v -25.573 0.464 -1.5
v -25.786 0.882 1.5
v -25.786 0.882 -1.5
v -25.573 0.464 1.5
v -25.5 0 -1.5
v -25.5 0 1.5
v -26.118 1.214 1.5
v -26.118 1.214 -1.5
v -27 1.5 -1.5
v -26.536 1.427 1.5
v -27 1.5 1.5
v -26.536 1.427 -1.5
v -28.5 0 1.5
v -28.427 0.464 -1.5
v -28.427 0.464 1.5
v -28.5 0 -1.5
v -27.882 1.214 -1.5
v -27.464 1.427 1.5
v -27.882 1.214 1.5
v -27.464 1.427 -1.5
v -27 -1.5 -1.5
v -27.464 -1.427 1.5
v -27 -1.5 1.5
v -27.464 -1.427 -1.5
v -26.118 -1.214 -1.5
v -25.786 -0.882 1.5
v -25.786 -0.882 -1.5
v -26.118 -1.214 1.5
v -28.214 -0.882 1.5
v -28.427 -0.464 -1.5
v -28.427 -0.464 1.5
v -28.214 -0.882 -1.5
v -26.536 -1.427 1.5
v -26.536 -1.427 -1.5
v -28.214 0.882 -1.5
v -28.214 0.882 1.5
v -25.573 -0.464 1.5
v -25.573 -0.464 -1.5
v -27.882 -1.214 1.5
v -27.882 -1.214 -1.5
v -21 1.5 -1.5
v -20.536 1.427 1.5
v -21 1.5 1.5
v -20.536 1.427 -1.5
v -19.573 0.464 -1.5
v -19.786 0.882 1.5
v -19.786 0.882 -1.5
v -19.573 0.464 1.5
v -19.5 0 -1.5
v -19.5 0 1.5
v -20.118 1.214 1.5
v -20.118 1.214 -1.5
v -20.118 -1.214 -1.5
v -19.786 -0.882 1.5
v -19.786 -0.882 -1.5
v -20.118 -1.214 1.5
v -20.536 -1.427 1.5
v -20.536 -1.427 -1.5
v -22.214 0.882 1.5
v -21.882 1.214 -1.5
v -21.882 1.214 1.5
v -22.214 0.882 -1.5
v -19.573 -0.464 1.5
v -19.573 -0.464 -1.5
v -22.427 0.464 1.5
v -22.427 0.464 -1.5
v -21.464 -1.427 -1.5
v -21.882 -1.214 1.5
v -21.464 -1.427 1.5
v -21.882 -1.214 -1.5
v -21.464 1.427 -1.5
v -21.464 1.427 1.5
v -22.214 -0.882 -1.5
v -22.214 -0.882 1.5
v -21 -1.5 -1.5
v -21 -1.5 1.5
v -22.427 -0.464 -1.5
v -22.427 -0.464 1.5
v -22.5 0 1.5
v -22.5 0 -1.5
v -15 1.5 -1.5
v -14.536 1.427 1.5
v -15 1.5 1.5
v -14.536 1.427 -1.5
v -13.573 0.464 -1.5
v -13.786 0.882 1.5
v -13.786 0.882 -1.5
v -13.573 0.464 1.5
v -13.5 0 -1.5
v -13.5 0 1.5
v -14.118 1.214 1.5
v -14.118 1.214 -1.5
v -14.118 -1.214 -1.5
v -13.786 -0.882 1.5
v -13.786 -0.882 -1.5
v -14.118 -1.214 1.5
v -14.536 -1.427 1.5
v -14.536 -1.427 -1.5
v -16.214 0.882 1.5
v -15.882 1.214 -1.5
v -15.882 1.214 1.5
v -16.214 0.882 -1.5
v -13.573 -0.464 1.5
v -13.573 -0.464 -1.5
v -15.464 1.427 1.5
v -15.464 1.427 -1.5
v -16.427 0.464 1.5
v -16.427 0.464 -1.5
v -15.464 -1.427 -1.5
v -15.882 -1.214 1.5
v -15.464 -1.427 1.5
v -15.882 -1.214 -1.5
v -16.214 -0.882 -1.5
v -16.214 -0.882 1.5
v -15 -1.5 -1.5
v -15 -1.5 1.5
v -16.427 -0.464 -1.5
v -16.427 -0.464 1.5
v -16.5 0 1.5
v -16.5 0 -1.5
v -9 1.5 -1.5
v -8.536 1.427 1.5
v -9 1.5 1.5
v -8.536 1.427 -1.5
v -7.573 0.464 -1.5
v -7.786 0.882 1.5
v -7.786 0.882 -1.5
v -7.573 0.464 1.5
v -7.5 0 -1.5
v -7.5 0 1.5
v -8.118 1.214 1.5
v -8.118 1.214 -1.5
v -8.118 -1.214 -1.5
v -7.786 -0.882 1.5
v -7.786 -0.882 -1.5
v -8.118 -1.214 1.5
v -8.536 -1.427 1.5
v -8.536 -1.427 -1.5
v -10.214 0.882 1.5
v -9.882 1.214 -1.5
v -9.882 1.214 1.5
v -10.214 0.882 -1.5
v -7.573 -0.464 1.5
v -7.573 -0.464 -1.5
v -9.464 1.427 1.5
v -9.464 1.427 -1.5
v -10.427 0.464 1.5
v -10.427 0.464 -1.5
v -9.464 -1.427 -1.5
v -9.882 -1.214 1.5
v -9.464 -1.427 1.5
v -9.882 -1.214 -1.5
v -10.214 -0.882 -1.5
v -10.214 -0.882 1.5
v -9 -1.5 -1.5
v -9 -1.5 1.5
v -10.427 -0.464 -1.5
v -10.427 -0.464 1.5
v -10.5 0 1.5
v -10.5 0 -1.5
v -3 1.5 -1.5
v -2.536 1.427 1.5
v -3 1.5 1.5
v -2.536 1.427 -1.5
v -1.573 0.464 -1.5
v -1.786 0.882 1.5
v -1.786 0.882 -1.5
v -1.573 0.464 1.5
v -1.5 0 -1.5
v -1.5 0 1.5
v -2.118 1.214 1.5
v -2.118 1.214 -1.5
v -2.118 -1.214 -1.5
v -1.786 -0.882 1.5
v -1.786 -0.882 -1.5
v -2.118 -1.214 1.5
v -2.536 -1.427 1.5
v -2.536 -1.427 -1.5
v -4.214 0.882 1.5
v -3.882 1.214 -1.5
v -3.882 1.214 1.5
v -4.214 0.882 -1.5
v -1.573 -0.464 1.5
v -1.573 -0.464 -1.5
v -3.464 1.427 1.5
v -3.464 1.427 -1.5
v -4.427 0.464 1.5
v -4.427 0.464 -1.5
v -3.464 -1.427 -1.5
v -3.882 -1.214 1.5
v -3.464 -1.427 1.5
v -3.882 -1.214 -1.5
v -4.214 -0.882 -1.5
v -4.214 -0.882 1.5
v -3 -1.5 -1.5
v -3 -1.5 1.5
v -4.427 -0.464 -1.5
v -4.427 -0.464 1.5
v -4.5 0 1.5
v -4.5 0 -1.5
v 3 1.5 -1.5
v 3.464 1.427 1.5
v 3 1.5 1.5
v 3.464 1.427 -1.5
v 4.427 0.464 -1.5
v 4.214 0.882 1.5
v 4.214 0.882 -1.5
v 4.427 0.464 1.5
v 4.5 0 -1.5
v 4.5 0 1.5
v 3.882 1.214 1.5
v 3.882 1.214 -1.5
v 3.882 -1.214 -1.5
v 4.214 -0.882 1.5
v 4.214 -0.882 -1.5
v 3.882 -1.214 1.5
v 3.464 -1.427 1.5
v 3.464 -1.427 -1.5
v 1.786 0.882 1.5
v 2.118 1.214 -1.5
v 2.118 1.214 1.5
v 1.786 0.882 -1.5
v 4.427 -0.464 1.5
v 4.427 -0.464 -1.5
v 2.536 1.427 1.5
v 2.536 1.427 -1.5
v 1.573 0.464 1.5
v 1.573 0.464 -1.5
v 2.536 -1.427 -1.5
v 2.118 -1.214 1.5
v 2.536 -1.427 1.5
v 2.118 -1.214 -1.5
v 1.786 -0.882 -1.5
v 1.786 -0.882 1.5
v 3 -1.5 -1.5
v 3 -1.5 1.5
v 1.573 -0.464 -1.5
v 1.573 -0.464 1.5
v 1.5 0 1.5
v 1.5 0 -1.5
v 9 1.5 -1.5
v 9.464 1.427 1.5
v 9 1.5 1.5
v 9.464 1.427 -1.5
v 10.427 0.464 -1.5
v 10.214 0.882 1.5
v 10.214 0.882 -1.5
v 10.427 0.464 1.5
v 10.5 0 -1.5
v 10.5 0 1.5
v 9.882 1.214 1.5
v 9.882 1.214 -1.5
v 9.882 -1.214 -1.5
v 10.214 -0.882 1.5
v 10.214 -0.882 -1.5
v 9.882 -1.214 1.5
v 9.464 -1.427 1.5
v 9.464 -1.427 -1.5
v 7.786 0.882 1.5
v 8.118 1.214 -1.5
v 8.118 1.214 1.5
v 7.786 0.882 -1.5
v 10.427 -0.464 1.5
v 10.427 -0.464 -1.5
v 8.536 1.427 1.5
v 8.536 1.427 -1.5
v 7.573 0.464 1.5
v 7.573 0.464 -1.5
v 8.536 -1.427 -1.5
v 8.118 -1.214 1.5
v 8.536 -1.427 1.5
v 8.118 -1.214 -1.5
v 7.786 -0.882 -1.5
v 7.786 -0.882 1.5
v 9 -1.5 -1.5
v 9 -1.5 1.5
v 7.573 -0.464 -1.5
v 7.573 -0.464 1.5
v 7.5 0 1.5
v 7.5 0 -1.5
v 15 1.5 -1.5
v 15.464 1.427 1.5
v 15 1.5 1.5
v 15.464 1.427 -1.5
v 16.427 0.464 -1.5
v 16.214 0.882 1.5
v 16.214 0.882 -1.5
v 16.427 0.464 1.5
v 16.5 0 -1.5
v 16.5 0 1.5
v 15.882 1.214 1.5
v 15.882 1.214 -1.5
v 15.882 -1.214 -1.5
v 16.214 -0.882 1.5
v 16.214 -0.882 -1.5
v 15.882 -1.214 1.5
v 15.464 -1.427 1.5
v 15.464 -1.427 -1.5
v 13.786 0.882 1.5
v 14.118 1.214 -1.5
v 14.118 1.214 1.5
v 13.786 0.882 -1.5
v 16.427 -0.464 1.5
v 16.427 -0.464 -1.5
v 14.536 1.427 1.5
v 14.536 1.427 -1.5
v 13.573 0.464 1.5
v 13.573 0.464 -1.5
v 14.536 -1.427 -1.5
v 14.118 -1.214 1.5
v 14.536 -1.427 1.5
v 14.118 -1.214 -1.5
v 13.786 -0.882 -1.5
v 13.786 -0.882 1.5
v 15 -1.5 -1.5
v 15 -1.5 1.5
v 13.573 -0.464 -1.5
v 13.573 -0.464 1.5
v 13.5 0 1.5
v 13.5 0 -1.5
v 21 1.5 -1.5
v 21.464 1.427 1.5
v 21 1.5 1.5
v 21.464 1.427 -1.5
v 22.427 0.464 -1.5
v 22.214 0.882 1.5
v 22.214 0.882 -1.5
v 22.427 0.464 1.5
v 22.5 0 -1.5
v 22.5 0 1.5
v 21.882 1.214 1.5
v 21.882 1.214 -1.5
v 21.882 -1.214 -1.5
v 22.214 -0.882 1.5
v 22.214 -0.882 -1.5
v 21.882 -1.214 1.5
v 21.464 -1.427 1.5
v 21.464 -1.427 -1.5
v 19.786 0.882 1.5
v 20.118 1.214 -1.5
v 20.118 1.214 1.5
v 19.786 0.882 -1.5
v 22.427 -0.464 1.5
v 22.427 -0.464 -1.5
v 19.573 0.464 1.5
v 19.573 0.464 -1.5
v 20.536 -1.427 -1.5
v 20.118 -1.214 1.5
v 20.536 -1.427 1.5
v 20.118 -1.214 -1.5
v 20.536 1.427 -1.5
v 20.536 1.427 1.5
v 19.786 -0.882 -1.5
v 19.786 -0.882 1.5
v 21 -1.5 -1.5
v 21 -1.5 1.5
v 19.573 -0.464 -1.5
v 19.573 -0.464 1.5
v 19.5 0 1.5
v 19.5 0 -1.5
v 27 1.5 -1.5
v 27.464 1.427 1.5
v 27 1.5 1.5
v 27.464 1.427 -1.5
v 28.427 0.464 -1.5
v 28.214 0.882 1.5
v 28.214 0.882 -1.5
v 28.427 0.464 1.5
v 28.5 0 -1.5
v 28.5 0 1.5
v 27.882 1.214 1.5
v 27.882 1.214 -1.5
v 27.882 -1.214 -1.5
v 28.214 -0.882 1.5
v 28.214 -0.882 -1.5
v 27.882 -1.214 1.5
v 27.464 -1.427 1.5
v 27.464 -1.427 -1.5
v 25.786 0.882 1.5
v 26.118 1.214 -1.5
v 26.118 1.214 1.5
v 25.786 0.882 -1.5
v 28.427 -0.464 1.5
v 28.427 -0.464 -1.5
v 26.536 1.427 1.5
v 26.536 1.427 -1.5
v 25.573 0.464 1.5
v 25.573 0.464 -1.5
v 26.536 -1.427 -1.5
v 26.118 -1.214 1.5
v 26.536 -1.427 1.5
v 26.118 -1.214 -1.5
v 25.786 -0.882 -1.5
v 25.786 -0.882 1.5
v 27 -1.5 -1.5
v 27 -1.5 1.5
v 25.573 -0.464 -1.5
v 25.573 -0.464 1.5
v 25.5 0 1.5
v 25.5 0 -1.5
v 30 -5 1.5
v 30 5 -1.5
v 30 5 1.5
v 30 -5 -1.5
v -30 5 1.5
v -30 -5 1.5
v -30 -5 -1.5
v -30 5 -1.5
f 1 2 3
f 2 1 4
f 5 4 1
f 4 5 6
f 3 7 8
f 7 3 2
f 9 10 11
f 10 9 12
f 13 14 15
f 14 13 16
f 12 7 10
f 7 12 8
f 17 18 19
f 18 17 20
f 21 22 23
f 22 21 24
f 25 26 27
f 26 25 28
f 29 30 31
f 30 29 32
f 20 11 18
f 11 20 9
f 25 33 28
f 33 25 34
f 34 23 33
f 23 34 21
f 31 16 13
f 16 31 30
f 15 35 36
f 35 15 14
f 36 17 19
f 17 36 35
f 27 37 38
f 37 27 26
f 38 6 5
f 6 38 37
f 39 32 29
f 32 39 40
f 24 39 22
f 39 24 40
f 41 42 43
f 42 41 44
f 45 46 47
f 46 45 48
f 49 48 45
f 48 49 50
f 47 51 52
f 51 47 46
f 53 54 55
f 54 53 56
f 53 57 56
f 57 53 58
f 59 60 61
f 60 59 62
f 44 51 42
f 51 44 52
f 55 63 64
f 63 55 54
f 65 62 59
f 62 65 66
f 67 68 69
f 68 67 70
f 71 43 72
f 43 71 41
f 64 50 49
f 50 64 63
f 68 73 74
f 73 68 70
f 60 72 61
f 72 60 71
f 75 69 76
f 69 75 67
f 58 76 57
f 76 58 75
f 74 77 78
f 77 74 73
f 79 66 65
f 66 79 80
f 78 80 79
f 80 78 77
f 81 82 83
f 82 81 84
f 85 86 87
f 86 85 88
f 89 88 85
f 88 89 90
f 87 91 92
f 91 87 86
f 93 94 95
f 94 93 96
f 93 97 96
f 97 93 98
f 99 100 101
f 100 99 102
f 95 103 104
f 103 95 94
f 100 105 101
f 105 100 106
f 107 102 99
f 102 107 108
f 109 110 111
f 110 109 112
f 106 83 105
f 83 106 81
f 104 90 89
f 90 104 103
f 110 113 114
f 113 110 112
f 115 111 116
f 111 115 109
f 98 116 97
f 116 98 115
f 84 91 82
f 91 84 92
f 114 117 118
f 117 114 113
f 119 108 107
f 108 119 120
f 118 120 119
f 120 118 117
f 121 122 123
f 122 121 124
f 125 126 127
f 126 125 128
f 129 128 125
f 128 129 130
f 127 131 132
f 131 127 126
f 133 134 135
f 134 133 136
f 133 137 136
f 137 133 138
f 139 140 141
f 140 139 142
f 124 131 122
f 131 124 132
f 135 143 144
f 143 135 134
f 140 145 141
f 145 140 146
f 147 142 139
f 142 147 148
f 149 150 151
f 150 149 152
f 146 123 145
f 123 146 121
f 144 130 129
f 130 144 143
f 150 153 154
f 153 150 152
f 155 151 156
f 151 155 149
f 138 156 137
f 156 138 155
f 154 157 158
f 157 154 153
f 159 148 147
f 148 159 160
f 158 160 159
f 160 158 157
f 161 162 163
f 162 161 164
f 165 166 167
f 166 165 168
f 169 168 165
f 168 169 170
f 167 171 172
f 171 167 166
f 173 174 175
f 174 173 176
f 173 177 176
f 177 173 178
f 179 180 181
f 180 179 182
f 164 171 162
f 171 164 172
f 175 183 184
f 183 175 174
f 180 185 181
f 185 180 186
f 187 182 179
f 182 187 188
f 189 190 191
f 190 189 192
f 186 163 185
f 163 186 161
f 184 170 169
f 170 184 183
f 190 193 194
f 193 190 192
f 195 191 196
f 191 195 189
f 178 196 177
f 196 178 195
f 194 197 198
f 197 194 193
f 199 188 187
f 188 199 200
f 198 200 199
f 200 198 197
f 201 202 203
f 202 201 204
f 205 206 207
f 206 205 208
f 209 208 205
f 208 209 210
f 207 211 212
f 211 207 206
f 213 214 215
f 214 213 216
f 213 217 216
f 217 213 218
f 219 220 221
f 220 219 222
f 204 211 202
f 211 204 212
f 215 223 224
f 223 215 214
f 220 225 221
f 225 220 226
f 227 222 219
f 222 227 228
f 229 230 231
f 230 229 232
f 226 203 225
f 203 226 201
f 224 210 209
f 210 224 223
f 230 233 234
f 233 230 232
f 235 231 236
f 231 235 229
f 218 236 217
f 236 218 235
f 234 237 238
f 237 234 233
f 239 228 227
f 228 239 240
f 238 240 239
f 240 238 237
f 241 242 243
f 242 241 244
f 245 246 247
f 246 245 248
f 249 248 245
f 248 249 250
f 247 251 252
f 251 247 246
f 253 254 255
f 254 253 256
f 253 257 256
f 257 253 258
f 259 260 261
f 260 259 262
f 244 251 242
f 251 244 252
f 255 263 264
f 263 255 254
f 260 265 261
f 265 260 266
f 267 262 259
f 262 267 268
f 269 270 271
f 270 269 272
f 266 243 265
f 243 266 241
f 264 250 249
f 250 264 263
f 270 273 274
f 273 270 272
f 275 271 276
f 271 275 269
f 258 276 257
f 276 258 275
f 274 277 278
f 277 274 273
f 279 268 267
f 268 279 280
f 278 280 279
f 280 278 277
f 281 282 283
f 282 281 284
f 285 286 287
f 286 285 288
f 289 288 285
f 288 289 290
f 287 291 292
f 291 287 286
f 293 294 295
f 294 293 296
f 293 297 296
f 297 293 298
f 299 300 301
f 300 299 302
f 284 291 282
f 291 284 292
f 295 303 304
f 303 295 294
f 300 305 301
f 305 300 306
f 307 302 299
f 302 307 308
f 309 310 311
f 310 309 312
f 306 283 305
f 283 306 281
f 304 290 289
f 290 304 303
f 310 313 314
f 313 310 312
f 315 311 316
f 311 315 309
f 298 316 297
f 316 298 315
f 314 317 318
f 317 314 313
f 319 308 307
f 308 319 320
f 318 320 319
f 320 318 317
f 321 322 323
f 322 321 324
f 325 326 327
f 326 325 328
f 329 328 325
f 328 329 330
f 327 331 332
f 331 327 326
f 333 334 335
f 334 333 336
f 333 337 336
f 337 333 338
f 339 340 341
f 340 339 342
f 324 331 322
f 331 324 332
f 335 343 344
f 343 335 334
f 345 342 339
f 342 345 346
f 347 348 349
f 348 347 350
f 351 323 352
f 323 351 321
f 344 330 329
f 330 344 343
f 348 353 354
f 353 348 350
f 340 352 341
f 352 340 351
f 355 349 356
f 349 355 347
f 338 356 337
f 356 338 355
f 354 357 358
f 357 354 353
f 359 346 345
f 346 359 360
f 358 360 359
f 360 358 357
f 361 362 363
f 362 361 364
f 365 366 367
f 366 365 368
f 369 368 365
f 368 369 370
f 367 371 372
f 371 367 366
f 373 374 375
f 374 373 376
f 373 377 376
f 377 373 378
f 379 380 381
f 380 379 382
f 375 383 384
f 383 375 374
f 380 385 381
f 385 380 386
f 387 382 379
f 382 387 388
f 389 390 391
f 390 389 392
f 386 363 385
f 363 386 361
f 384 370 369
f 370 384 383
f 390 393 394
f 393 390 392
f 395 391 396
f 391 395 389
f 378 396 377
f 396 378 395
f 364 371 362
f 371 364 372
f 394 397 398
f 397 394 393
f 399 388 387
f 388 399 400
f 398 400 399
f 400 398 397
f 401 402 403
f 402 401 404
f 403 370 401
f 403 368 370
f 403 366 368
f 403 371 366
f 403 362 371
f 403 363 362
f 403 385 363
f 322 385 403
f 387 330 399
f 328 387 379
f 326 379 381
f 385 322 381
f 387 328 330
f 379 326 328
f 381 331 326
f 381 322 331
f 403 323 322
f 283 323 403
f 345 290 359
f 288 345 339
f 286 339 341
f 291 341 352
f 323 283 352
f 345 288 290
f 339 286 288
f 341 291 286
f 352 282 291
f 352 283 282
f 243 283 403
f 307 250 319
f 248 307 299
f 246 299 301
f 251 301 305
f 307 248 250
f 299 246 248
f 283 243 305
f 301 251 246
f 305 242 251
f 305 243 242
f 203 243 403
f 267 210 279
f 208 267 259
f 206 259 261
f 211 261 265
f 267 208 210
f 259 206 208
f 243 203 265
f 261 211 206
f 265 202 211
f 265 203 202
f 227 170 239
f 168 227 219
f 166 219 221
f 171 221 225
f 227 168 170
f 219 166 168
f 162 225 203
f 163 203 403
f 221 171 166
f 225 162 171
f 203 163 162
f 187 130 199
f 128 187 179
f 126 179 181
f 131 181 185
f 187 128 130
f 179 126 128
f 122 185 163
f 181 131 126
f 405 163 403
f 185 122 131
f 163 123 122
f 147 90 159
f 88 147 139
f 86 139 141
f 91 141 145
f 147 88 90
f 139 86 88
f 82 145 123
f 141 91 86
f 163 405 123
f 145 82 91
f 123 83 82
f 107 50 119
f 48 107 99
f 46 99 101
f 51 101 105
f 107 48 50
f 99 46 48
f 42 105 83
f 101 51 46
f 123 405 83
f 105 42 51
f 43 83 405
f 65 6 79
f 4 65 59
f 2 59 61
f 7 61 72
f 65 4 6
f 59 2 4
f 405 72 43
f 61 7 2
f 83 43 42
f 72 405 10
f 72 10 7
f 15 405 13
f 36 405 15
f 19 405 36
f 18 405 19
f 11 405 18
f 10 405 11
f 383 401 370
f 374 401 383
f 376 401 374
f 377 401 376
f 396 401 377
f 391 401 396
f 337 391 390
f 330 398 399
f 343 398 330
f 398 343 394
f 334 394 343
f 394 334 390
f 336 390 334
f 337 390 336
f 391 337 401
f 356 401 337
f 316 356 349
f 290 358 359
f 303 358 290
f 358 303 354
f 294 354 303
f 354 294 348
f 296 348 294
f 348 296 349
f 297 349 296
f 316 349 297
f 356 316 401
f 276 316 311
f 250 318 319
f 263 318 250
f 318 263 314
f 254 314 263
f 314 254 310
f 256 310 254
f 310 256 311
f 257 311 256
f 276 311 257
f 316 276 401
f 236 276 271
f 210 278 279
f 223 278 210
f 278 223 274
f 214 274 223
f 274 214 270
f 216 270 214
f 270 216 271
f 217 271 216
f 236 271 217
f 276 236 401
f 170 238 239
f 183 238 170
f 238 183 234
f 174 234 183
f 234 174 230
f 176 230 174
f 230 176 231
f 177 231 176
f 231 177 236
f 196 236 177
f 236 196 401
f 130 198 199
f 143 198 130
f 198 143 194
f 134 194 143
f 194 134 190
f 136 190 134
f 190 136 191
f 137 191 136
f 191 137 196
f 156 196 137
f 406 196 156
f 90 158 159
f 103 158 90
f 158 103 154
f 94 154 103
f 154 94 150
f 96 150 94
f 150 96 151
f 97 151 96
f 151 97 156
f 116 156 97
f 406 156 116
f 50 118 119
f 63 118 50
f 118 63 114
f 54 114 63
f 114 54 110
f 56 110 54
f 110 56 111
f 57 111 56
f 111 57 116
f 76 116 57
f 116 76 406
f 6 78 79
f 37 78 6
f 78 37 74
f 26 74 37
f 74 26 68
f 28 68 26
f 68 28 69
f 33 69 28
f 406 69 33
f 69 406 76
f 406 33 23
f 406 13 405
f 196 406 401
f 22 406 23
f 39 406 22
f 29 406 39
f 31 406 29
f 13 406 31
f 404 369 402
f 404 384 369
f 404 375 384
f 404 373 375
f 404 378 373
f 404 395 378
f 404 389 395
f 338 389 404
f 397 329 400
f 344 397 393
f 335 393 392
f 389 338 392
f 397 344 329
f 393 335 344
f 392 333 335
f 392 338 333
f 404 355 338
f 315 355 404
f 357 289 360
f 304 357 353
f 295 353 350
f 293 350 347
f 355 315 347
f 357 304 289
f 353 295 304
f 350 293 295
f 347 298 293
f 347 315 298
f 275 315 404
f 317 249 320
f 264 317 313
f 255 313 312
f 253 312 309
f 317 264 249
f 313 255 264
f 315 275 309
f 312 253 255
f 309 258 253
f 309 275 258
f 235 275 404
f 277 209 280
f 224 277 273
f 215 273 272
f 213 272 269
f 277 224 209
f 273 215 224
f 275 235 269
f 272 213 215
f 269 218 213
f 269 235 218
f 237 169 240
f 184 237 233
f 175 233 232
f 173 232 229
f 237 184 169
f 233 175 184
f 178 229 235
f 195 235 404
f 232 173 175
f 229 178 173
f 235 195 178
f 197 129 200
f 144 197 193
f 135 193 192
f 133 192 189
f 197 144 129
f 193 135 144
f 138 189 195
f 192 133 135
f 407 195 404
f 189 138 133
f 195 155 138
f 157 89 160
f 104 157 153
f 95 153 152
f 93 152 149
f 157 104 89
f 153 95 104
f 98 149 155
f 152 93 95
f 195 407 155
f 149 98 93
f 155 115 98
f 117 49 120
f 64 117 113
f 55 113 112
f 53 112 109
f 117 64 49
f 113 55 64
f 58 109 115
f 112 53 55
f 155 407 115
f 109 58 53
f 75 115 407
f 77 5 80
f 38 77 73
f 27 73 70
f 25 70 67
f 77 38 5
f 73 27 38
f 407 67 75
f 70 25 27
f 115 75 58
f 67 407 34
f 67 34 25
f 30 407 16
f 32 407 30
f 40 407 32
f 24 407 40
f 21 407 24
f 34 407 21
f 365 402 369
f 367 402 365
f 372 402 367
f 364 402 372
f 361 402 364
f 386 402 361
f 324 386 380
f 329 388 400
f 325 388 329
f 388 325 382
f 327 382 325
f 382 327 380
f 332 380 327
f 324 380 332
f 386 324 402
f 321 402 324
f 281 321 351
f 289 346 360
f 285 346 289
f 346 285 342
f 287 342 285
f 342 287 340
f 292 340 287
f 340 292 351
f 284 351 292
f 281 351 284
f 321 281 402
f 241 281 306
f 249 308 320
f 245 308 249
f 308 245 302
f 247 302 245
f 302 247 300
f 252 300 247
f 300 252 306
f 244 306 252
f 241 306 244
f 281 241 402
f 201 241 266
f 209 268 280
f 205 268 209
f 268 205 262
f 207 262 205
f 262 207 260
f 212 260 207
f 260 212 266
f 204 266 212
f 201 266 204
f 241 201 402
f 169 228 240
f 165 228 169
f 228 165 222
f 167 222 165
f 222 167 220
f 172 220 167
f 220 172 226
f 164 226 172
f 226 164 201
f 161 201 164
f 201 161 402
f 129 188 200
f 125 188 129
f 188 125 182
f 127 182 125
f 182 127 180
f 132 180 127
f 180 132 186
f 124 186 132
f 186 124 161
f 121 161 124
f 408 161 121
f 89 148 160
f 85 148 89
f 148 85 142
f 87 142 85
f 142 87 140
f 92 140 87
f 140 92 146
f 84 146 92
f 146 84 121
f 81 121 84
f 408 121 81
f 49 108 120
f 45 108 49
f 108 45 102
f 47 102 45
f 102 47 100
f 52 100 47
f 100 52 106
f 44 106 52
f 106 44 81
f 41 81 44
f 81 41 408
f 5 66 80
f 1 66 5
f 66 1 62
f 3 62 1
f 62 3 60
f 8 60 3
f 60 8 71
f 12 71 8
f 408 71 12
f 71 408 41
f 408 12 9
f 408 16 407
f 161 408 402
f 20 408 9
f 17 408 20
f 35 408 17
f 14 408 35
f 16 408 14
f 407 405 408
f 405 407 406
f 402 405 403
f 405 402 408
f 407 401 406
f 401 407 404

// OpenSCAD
drill = 3;
d = 6;
n=10;
   
lx= n*d;
anchura = 10;
grosor = 3;

difference(){
    //-- Cuerpo de la pieza
    cube([lx,anchura,grosor],center=true);
    
    //-- Taladros
    translate([-lx/2+d/2,0,0])
    for(i=[0:n-1]){ 
        translate([i*d,0,0])
            cylinder(r=drill/2, h=grosor+5, $fn=20, center=true);
    }
}
